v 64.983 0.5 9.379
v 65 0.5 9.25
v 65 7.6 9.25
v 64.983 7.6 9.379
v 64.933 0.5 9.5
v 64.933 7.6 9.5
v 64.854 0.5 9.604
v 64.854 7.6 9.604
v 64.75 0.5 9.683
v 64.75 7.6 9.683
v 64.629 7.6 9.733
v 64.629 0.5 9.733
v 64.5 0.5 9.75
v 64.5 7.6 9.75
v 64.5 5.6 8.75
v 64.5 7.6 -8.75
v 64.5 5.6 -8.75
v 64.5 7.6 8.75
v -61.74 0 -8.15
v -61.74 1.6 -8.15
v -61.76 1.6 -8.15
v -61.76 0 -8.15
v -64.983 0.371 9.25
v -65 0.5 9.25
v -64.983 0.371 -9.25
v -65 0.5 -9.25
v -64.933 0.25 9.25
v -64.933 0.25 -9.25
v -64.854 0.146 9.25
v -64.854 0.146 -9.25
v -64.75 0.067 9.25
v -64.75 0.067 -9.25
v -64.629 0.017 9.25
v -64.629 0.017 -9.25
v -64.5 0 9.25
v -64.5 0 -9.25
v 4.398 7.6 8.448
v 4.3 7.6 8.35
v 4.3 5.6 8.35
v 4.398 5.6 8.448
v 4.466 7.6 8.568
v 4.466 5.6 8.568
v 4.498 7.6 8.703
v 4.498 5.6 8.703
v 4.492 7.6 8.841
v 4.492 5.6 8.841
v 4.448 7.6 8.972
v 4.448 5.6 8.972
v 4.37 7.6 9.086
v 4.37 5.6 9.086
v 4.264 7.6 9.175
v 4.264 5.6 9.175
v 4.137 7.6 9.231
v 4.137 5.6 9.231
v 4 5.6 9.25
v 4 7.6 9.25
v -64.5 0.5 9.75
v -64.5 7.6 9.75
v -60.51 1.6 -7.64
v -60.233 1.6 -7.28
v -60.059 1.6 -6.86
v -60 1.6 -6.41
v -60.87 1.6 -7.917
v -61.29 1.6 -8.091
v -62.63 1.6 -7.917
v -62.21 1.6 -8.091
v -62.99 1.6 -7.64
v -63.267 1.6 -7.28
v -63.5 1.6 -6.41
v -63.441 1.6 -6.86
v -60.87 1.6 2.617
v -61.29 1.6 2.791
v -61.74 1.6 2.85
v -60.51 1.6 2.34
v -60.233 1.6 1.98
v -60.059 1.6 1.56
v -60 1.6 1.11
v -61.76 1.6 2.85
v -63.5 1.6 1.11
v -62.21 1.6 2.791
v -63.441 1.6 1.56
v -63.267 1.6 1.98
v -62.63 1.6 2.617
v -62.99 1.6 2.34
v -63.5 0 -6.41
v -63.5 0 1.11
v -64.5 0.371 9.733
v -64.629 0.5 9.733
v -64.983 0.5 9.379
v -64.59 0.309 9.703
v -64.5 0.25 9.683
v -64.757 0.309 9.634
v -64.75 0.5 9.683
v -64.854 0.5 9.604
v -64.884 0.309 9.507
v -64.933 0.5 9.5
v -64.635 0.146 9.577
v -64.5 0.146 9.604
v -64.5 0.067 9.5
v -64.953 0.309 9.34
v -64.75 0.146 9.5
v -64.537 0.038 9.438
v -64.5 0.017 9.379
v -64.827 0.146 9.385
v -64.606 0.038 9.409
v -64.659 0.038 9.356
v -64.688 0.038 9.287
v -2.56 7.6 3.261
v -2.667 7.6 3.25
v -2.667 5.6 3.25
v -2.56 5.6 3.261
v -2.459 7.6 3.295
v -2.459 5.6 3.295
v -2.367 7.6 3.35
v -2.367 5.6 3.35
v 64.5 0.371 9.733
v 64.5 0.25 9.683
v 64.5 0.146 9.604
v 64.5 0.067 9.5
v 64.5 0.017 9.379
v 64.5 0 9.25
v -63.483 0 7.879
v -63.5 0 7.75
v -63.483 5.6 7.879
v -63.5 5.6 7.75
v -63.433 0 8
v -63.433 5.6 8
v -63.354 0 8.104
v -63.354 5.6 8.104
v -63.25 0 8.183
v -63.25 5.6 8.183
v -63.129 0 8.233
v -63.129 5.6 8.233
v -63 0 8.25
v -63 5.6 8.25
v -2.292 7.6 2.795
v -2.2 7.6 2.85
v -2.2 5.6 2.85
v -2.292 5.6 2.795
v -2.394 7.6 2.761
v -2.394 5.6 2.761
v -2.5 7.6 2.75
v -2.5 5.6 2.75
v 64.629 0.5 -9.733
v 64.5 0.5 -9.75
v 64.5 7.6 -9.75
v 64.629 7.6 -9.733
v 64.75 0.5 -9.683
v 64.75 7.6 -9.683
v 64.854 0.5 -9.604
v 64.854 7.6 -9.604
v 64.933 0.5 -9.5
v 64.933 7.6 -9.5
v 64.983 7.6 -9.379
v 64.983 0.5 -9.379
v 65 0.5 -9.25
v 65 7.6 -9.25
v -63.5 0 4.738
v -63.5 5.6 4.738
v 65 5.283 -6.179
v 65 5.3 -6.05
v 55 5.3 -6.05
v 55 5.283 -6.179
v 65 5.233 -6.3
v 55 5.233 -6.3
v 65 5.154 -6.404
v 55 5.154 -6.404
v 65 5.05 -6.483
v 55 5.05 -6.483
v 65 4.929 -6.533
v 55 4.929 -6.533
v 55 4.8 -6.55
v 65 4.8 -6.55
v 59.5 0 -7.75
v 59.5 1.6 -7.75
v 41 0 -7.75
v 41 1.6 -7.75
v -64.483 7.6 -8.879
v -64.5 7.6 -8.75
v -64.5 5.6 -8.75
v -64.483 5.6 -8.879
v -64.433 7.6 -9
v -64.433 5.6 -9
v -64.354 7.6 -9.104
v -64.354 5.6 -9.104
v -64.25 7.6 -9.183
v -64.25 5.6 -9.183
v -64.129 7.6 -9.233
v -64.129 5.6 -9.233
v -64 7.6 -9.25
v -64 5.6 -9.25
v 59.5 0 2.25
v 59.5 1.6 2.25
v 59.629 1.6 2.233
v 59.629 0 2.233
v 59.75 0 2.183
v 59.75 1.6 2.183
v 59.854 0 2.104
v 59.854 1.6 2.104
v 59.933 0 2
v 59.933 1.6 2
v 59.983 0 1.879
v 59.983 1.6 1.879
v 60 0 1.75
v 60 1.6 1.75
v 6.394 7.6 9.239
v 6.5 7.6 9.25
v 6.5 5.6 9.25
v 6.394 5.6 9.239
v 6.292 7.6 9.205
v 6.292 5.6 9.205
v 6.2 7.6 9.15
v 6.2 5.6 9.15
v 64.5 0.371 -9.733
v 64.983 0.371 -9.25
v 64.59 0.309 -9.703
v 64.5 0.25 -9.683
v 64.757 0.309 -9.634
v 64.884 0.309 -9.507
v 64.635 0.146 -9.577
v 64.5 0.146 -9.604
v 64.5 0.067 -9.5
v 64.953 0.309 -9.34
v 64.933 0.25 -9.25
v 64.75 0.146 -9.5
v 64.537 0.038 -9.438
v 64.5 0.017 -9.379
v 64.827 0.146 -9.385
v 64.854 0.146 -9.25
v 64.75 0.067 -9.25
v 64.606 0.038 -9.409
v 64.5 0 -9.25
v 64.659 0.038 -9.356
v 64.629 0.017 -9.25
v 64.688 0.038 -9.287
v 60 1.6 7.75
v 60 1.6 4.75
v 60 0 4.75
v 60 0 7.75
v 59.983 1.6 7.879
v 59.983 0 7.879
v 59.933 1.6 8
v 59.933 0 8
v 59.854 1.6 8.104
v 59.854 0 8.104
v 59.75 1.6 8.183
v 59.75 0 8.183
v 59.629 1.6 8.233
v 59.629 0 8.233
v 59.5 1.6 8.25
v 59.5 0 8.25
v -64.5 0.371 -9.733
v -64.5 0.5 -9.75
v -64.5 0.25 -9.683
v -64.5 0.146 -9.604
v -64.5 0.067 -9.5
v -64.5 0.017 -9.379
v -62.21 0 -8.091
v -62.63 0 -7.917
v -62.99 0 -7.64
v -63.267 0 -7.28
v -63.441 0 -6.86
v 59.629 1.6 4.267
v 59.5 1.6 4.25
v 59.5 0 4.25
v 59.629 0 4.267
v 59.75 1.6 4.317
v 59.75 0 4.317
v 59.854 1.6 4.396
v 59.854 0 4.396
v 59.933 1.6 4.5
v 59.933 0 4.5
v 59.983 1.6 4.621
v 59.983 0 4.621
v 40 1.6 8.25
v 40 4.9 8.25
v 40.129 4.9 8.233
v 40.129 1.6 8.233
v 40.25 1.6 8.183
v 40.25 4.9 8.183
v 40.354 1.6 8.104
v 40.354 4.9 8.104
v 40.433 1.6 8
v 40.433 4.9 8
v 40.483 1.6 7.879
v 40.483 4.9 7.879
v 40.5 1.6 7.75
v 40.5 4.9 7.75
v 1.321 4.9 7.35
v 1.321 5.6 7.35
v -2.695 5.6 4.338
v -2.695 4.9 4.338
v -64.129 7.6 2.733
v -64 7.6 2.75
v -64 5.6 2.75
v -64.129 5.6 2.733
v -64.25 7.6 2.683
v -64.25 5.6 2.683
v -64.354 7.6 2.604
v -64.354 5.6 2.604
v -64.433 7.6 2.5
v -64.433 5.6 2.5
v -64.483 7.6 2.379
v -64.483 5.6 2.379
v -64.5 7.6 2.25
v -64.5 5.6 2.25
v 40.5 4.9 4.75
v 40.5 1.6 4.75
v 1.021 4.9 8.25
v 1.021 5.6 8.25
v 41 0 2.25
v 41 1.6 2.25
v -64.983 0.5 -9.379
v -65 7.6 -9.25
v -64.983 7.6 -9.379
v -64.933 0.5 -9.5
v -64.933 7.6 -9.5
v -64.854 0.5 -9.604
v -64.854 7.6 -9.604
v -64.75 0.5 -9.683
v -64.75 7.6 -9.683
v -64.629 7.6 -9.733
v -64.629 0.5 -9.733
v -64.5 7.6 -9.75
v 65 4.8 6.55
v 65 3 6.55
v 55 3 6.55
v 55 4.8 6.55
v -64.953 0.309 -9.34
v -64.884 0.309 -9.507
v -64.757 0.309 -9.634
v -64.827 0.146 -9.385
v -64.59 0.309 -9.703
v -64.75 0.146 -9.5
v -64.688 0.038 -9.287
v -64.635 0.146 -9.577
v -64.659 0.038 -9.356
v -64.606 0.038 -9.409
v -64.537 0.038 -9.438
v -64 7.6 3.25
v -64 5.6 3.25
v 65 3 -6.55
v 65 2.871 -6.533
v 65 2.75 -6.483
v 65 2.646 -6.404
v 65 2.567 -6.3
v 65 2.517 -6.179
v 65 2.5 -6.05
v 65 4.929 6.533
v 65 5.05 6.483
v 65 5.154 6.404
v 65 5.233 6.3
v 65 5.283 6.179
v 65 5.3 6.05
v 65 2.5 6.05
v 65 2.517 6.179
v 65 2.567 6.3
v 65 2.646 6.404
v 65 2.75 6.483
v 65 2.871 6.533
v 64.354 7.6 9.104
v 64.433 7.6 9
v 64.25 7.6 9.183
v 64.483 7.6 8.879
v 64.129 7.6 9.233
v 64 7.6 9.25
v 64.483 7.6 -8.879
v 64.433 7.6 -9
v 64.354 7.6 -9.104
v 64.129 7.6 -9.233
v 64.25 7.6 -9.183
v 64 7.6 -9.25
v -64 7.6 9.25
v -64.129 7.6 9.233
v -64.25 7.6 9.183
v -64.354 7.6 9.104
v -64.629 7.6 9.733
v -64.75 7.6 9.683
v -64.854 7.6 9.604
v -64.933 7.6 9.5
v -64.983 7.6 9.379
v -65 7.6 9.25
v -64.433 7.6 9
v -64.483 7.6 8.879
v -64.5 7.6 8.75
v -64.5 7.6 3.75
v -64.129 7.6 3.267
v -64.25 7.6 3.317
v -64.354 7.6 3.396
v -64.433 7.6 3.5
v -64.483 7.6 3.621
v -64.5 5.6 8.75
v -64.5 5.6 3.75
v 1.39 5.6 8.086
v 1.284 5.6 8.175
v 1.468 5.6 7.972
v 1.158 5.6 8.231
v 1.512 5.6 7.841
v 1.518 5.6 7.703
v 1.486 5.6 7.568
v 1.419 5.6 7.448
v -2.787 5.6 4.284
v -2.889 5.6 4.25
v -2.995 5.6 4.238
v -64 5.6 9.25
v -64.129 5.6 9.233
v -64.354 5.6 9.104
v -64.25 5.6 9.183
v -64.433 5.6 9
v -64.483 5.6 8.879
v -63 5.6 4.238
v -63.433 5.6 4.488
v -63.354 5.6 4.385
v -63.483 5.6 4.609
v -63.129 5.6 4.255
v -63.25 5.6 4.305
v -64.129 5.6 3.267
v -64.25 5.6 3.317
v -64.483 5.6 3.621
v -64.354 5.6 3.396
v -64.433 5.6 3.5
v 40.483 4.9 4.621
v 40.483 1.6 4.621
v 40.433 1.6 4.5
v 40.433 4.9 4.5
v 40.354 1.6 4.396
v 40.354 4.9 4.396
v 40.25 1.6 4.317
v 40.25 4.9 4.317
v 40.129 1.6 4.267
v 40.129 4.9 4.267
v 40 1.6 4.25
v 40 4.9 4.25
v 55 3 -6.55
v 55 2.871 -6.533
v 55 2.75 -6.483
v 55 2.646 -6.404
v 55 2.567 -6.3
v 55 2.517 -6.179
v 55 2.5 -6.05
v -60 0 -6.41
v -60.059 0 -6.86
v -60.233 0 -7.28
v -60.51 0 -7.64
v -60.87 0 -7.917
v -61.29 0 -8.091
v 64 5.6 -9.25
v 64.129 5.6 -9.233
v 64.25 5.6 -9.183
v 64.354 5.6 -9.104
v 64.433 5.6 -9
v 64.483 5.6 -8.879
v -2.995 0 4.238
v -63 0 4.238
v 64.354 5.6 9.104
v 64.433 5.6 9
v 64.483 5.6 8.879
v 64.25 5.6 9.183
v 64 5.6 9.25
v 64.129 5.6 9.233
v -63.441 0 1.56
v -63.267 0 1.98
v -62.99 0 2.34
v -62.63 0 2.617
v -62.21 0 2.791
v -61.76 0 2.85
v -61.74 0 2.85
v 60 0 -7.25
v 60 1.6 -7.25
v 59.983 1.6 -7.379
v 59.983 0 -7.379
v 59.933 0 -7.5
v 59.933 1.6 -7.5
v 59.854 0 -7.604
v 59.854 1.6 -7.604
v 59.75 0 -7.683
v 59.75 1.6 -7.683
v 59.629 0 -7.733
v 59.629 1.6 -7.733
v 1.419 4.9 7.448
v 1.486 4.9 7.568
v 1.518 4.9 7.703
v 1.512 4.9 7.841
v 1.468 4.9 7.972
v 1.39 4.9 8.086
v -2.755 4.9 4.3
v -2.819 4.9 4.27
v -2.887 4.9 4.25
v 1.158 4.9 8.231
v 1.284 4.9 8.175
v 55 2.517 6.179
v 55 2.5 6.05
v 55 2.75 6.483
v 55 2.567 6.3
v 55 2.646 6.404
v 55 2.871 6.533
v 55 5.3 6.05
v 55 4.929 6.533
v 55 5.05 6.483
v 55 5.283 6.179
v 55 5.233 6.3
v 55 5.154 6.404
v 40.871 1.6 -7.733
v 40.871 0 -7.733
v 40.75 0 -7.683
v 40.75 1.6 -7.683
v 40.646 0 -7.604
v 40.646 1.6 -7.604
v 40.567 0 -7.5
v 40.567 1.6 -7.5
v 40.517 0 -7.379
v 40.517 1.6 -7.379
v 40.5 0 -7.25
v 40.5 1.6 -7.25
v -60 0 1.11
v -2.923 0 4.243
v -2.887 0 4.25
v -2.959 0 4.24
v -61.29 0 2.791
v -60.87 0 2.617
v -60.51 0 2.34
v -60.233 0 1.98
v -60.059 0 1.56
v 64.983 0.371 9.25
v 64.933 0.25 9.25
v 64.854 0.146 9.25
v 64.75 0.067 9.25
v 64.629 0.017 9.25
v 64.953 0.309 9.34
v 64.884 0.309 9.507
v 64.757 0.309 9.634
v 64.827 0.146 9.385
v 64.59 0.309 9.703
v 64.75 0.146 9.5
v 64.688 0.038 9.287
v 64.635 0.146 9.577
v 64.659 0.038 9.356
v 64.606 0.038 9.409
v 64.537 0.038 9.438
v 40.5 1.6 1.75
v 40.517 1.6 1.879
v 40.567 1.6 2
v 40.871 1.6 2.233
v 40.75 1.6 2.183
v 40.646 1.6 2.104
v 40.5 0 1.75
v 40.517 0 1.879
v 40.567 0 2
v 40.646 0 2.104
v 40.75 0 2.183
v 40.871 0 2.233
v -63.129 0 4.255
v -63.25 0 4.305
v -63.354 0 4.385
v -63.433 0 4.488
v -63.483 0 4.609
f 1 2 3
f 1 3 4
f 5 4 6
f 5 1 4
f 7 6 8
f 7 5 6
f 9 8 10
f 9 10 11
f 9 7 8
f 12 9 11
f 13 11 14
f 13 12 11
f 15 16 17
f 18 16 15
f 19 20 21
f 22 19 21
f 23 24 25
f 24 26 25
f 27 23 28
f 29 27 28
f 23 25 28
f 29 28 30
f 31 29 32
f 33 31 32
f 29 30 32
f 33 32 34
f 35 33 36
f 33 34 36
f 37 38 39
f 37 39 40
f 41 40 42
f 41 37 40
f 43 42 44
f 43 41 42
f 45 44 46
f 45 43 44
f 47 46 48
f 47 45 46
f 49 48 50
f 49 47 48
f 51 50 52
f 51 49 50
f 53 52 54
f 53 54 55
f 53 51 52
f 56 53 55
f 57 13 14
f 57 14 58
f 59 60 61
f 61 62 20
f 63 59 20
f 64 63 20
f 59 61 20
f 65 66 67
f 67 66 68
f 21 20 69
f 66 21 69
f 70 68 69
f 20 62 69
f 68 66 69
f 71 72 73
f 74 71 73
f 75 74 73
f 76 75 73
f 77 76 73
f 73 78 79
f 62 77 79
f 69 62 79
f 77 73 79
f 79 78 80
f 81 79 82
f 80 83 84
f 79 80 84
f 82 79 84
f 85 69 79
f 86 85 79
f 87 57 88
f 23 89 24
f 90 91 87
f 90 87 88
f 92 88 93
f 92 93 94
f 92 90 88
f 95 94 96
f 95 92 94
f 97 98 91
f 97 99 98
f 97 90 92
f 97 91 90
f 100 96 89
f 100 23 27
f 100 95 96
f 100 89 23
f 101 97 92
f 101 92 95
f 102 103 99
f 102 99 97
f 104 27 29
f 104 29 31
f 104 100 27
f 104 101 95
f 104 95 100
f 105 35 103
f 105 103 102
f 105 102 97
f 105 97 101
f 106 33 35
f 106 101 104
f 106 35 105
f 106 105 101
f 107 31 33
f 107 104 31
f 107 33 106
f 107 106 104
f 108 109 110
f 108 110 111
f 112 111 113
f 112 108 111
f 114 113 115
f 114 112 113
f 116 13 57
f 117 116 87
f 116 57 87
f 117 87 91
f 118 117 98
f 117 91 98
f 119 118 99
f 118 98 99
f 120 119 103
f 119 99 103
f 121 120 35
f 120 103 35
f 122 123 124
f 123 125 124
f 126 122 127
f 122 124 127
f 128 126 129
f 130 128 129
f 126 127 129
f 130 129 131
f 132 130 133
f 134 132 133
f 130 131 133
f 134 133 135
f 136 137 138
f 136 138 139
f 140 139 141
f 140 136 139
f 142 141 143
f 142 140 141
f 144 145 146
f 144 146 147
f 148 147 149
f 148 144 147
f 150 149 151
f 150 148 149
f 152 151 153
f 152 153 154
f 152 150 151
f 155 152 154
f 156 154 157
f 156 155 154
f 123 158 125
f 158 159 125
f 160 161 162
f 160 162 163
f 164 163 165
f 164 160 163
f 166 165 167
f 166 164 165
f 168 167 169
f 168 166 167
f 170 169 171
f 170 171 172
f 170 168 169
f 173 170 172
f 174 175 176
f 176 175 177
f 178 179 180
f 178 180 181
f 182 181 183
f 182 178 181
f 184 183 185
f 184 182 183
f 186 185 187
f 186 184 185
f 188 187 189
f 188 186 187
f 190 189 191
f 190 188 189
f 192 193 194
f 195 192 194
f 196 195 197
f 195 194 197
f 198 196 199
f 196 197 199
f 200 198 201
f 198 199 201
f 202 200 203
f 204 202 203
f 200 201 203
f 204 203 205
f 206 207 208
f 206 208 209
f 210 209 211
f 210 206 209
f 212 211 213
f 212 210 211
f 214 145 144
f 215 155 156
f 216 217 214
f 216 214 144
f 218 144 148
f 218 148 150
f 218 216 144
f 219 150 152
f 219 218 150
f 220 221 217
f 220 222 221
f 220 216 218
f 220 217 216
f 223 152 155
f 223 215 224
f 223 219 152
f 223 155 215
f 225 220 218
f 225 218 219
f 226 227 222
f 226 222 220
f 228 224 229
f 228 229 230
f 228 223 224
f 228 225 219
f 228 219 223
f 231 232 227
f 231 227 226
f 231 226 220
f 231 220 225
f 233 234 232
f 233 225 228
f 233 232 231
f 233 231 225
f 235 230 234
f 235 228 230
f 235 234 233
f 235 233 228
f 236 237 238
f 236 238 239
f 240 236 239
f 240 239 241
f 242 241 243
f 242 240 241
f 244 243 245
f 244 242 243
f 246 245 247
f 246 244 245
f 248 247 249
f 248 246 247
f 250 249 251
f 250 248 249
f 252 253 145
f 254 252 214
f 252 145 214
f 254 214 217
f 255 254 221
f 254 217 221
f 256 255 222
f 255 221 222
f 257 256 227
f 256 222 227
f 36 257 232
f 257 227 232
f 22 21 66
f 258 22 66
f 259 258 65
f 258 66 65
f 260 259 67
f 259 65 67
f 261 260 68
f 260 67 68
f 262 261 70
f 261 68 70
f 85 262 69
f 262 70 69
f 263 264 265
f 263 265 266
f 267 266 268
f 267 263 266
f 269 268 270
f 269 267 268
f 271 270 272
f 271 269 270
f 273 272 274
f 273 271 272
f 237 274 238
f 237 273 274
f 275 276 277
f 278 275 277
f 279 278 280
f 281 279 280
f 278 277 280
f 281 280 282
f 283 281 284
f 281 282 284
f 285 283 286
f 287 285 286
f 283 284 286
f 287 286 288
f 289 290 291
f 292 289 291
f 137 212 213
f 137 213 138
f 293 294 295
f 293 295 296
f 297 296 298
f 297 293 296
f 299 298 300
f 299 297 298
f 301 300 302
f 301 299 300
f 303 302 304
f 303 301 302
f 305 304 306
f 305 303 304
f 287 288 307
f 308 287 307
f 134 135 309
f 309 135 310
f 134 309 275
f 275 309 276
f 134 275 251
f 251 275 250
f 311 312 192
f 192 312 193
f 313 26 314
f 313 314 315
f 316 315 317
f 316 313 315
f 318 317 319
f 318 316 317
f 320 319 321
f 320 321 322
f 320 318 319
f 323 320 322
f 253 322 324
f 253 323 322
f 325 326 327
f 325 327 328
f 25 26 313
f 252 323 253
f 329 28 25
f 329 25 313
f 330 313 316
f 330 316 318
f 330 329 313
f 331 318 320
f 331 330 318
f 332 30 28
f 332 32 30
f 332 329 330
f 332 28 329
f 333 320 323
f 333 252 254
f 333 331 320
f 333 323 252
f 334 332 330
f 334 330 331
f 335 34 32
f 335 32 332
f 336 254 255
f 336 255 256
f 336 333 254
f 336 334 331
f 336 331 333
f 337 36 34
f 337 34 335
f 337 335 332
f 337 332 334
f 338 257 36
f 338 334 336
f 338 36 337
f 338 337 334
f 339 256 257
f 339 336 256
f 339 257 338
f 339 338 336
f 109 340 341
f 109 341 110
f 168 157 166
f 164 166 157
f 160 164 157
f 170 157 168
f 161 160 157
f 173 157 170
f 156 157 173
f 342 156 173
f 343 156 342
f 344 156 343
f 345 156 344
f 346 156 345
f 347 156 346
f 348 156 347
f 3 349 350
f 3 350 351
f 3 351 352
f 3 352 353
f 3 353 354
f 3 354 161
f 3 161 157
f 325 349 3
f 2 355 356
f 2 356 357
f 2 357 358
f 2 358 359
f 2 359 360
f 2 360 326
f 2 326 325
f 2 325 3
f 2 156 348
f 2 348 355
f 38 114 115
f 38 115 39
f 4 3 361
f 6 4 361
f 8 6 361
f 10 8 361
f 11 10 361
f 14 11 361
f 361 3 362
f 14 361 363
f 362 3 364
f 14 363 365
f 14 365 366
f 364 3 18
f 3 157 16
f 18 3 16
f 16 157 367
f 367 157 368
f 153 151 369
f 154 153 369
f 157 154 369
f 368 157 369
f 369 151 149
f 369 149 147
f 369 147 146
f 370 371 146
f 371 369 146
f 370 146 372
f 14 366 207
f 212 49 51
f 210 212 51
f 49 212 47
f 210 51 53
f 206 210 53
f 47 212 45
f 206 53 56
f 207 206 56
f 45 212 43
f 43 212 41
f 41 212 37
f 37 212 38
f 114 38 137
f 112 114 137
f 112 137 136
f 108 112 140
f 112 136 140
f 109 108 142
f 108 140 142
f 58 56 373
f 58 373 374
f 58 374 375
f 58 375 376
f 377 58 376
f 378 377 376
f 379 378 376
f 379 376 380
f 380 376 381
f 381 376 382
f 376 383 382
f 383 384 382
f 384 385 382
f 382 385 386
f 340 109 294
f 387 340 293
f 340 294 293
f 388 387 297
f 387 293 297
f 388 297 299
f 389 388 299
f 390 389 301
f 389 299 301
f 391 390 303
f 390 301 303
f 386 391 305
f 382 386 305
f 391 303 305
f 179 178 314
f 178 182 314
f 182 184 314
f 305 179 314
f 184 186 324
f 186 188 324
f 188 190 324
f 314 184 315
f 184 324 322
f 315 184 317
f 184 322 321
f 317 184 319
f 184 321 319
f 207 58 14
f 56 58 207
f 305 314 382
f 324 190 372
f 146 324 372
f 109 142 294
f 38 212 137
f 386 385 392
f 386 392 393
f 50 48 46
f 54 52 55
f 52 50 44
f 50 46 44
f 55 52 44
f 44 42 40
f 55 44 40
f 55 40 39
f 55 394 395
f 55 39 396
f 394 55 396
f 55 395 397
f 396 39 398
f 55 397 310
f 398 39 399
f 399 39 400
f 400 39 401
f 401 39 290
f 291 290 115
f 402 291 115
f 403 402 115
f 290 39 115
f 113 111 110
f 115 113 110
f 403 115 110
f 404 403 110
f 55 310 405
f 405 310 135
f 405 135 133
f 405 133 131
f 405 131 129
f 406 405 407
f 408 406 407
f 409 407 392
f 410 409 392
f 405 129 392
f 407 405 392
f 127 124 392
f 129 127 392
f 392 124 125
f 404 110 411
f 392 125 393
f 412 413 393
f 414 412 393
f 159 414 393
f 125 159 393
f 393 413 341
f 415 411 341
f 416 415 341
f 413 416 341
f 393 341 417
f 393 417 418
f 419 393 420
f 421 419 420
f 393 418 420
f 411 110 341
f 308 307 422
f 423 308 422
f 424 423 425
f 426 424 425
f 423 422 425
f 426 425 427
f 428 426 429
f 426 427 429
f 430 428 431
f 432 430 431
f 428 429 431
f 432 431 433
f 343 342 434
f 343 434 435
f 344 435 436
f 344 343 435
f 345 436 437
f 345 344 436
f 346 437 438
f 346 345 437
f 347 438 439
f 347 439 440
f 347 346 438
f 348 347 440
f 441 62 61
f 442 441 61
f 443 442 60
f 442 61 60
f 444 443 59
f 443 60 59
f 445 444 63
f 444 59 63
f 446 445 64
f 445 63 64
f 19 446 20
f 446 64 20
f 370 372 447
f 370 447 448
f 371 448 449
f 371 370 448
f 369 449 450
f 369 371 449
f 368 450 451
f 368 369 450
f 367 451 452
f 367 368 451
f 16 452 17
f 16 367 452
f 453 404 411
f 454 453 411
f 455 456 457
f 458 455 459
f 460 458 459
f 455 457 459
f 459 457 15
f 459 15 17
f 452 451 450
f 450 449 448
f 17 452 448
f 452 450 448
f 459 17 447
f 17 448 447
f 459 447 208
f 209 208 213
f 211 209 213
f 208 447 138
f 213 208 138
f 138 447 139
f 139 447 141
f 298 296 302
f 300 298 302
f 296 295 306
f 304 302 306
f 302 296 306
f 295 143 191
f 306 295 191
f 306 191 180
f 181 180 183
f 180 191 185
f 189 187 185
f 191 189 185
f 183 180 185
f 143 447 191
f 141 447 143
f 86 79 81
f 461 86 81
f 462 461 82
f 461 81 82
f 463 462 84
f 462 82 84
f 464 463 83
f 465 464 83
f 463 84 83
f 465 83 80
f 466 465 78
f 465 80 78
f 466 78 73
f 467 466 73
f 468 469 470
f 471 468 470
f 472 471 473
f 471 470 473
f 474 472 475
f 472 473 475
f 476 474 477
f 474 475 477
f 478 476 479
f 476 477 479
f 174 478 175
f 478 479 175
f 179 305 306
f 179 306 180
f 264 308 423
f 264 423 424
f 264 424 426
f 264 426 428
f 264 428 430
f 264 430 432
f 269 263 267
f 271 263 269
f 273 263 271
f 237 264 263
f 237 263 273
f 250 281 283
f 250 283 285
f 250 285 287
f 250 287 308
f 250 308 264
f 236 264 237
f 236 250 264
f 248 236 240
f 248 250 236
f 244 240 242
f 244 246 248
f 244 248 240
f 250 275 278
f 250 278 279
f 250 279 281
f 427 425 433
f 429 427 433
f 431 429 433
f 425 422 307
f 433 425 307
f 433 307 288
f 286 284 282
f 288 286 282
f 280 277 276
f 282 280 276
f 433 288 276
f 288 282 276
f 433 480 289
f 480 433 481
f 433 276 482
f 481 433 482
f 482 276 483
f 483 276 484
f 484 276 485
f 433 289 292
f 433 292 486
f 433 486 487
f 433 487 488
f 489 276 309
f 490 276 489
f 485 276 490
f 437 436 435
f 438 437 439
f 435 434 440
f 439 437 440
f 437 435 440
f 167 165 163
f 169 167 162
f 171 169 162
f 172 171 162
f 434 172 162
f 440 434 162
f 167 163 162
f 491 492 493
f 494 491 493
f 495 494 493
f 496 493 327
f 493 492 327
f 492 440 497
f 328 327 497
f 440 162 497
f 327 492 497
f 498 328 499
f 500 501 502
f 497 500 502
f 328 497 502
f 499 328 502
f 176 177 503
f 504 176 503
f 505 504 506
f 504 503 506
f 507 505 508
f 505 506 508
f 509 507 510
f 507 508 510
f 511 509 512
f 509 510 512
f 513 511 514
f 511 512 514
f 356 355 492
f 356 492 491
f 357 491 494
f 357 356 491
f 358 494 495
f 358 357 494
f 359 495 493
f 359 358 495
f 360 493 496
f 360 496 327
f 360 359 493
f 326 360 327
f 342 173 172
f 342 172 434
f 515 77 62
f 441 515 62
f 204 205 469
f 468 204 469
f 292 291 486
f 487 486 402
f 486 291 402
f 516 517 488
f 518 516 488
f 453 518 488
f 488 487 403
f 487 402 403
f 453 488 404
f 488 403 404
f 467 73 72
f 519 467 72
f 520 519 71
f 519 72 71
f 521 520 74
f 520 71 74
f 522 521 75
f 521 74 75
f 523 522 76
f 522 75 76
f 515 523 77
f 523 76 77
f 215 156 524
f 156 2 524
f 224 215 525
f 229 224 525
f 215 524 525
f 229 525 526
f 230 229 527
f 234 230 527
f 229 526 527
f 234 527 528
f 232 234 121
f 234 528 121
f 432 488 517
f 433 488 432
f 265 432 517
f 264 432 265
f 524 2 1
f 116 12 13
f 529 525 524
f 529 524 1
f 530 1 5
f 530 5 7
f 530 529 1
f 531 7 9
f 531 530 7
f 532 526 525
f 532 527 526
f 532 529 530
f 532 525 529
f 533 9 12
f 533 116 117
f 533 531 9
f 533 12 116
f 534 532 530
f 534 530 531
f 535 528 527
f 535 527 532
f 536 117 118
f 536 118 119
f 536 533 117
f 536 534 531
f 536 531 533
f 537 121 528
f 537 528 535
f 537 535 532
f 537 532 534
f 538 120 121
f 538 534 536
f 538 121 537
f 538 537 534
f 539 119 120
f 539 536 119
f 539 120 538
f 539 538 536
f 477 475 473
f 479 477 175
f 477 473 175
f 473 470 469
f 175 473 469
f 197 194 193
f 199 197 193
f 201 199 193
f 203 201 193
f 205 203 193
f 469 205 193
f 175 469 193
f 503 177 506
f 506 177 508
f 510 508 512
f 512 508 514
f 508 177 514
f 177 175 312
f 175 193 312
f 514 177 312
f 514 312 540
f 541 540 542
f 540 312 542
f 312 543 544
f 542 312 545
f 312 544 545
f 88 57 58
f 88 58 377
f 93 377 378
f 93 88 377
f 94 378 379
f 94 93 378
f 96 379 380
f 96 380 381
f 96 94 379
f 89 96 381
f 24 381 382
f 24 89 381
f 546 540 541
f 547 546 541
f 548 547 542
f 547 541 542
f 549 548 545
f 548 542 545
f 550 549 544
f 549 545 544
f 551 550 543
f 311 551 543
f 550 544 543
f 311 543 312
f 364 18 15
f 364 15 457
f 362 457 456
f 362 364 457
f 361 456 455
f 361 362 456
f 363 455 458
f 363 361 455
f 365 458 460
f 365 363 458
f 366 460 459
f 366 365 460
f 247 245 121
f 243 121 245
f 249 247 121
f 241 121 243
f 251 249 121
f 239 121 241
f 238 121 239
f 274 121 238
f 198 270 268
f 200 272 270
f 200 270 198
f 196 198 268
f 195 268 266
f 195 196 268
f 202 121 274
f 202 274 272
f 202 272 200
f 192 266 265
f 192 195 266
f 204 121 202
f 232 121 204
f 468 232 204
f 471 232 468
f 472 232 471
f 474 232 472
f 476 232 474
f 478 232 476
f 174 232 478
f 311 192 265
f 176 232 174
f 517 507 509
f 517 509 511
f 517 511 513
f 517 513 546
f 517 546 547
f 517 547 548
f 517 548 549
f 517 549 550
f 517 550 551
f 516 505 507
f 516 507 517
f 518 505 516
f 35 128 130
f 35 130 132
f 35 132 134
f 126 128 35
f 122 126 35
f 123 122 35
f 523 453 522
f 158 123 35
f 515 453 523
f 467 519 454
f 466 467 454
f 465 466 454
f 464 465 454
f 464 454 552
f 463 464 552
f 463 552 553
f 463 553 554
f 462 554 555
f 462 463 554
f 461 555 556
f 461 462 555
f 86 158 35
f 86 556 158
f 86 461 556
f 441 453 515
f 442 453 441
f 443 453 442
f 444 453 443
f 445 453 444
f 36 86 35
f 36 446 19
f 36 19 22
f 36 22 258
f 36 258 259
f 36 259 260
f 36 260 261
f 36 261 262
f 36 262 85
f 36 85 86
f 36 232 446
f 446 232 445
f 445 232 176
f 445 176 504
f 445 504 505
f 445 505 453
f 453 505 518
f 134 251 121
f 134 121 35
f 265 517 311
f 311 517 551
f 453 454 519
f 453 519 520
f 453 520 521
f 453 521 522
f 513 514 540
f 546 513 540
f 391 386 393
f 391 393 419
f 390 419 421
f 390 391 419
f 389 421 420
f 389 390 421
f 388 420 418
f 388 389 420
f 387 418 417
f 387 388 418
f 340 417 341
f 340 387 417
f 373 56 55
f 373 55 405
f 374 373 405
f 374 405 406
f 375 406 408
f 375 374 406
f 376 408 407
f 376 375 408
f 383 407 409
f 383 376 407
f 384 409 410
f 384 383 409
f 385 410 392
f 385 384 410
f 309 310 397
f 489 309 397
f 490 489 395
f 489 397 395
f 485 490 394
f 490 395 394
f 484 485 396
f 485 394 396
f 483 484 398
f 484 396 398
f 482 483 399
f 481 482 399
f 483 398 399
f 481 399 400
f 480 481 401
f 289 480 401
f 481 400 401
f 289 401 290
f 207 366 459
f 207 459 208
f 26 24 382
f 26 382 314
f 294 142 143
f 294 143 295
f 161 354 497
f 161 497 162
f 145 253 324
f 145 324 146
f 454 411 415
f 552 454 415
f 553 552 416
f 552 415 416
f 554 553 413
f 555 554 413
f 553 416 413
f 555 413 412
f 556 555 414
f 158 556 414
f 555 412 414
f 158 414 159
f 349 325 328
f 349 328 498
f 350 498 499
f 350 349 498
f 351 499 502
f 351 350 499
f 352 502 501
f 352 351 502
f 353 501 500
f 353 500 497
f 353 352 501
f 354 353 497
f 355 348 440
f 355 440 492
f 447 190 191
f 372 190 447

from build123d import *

# Parameters (mm, degrees)
EXTRUDE_1_DEPTH     = 7.6
CUT_EXTRUDE_1_DEPTH = 2
CUT_EXTRUDE_2_DEPTH = 66.965312855
CUT_EXTRUDE_START   = -1.6
CUT_EXTRUDE_3_DEPTH = 1.6
CUT_EXTRUDE_START_2 = -3.3
CUT_EXTRUDE_4_DEPTH = 3.3
CUT_EXTRUDE_5_DEPTH = 10
FILLET_1_R          = 0.5


with BuildPart() as part:
    # Эскиз1 → Бобышка-Вытянуть1 (new body)
    with BuildSketch(Plane(origin=(0, 0, 0), x_dir=(1, 0, 0), z_dir=(0, 1, 0))):
        with BuildLine():
            Line((-64.5, 9.75), (64.5, 9.75))
            ThreePointArc((64.5, 9.75), (64.853553391, 9.603553391), (65, 9.25))
            Line((65, 9.25), (65, -9.25))
            ThreePointArc((65, -9.25), (64.853553391, -9.603553391), (64.5, -9.75))
            Line((64.5, -9.75), (-64.5, -9.75))
            ThreePointArc((-64.5, -9.75), (-64.853553391, -9.603553391), (-65, -9.25))
            Line((-65, -9.25), (-65, 9.25))
            ThreePointArc((-65, 9.25), (-64.853553391, 9.603553391), (-64.5, 9.75))
        make_face()
    extrude(amount=EXTRUDE_1_DEPTH)

    # Эскиз2 → Вырез-Вытянуть1 (cut)
    with BuildSketch(Plane(origin=(0, 7.6, 0), x_dir=(1, 0, 0), z_dir=(0, 1, 0))):
        with BuildLine():
            Line((-64, -3.25), (-2.666666667, -3.25))
            ThreePointArc((-2.666666667, -3.25), (-2.508552784, -3.275658351), (-2.366666667, -3.35))
            Line((-2.366666667, -3.35), (4.3, -8.35))
            ThreePointArc((4.3, -8.35), (4.474341649, -8.908113883), (4, -9.25))
            Line((4, -9.25), (-64, -9.25))
            ThreePointArc((-64, -9.25), (-64.353553391, -9.103553391), (-64.5, -8.75))
            Line((-64.5, -8.75), (-64.5, -3.75))
            ThreePointArc((-64.5, -3.75), (-64.353553391, -3.396446609), (-64, -3.25))
        make_face()
        with BuildLine():
            Line((-64, 9.25), (64, 9.25))
            ThreePointArc((64, 9.25), (64.353553391, 9.103553391), (64.5, 8.75))
            Line((64.5, 8.75), (64.5, -8.75))
            ThreePointArc((64.5, -8.75), (64.353553391, -9.103553391), (64, -9.25))
            Line((64, -9.25), (6.5, -9.25))
            ThreePointArc((6.5, -9.25), (6.341886117, -9.224341649), (6.2, -9.15))
            Line((6.2, -9.15), (-2.2, -2.85))
            ThreePointArc((-2.2, -2.85), (-2.341886117, -2.775658351), (-2.5, -2.75))
            Line((-2.5, -2.75), (-64, -2.75))
            ThreePointArc((-64, -2.75), (-64.353553391, -2.603553391), (-64.5, -2.25))
            Line((-64.5, -2.25), (-64.5, 8.75))
            ThreePointArc((-64.5, 8.75), (-64.353553391, 9.103553391), (-64, 9.25))
        make_face()
    extrude(amount=-CUT_EXTRUDE_1_DEPTH, mode=Mode.SUBTRACT)

    # Эскиз6 → Вырез-Вытянуть2 (cut, through all)
    with BuildSketch(Plane(origin=(0, 5.6, 0), x_dir=(1, 0, 0), z_dir=(0, 1, 0))):
        with BuildLine():
            Line((-63, -8.25), (1.020582083, -8.25))
            ThreePointArc((1.020582083, -8.25), (1.494923732, -7.908113883), (1.320582083, -7.35))
            Line((1.320582083, -7.35), (-2.695152274, -4.338199232))
            ThreePointArc((-2.695152274, -4.338199232), (-2.837038391, -4.263857583), (-2.995152274, -4.238199232))
            Line((-2.995152274, -4.238199232), (-63, -4.238199232))
            ThreePointArc((-63, -4.238199232), (-63.353553391, -4.384645841), (-63.5, -4.738199232))
            Line((-63.5, -4.738199232), (-63.5, -7.75))
            ThreePointArc((-63.5, -7.75), (-63.353553391, -8.103553391), (-63, -8.25))
        make_face()
    extrude(amount=-CUT_EXTRUDE_2_DEPTH, mode=Mode.SUBTRACT)

    # Эскиз7 → Вырез-Вытянуть3 (cut)
    with BuildSketch(Plane.XZ.offset(CUT_EXTRUDE_START)):
        with BuildLine():
            Line((-63, 4.25), (59.5, 4.25))
            ThreePointArc((59.5, 4.25), (59.853553391, 4.396446609), (60, 4.75))
            Line((60, 4.75), (60, 7.75))
            ThreePointArc((60, 7.75), (59.853553391, 8.103553391), (59.5, 8.25))
            Line((59.5, 8.25), (-63, 8.25))
            ThreePointArc((-63, 8.25), (-63.353553391, 8.103553391), (-63.5, 7.75))
            Line((-63.5, 7.75), (-63.5, 4.75))
            ThreePointArc((-63.5, 4.75), (-63.353553391, 4.396446609), (-63, 4.25))
        make_face()
        with BuildLine():
            Line((59.5, -7.75), (41, -7.75))
            ThreePointArc((41, -7.75), (40.646446609, -7.603553391), (40.5, -7.25))
            Line((40.5, -7.25), (40.5, 1.75))
            ThreePointArc((40.5, 1.75), (40.646446609, 2.103553391), (41, 2.25))
            Line((41, 2.25), (59.5, 2.25))
            ThreePointArc((59.5, 2.25), (59.853553391, 2.103553391), (60, 1.75))
            Line((60, 1.75), (60, -7.25))
            ThreePointArc((60, -7.25), (59.853553391, -7.603553391), (59.5, -7.75))
        make_face()
        with BuildLine():
            Line((-61.74, -8.15), (-61.76, -8.15))
            ThreePointArc((-61.76, -8.15), (-62.990365799, -7.640365799), (-63.5, -6.41))
            Line((-63.5, -6.41), (-63.5, 1.11))
            ThreePointArc((-63.5, 1.11), (-62.990365799, 2.340365799), (-61.76, 2.85))
            Line((-61.76, 2.85), (-61.74, 2.85))
            ThreePointArc((-61.74, 2.85), (-60.509634201, 2.340365799), (-60, 1.11))
            Line((-60, 1.11), (-60, -6.41))
            ThreePointArc((-60, -6.41), (-60.509634201, -7.640365799), (-61.74, -8.15))
        make_face()
    extrude(amount=CUT_EXTRUDE_3_DEPTH, mode=Mode.SUBTRACT)

    # Эскиз8 → Вырез-Вытянуть4 (cut)
    with BuildSketch(Plane.XZ.offset(-1.6).offset(CUT_EXTRUDE_START_2)):
        with BuildLine():
            Line((-63, 8.25), (40, 8.25))
            ThreePointArc((40, 8.25), (40.353553391, 8.103553391), (40.5, 7.75))
            Line((40.5, 7.75), (40.5, 4.75))
            ThreePointArc((40.5, 4.75), (40.353553391, 4.396446609), (40, 4.25))
            Line((40, 4.25), (-63, 4.25))
            ThreePointArc((-63, 4.25), (-63.353553391, 4.396446609), (-63.5, 4.75))
            Line((-63.5, 4.75), (-63.5, 7.75))
            ThreePointArc((-63.5, 7.75), (-63.353553391, 8.103553391), (-63, 8.25))
        make_face()
    extrude(amount=CUT_EXTRUDE_4_DEPTH, mode=Mode.SUBTRACT)

    # Эскиз9 → Вырез-Вытянуть5 (cut)
    with BuildSketch(Plane(origin=(65, 0, 0), x_dir=(0, 0, -1), z_dir=(1, 0, 0))):
        with BuildLine():
            Line((-6.05, 5.3), (6.05, 5.3))
            ThreePointArc((6.05, 5.3), (6.403553391, 5.153553391), (6.55, 4.8))
            Line((6.55, 4.8), (6.55, 3))
            ThreePointArc((6.55, 3), (6.403553391, 2.646446609), (6.05, 2.5))
            Line((6.05, 2.5), (-6.05, 2.5))
            ThreePointArc((-6.05, 2.5), (-6.403553391, 2.646446609), (-6.55, 3))
            Line((-6.55, 3), (-6.55, 4.8))
            ThreePointArc((-6.55, 4.8), (-6.403553391, 5.153553391), (-6.05, 5.3))
        make_face()
    extrude(amount=-CUT_EXTRUDE_5_DEPTH, mode=Mode.SUBTRACT)

    # Скругление1
    fillet_1_edges = [part.edges().sort_by_distance(p)[0] for p in [
        (0, 0, -9.75),
        (64.853553391, 0, -9.603553391),
        (65, 0, 0),
        (64.853553391, 0, 9.603553391),
        (0, 0, 9.75),
        (-64.853553391, 0, 9.603553391),
        (-65, 0, 0),
        (-64.853553391, 0, -9.603553391),
    ]]
    fillet(fillet_1_edges, radius=FILLET_1_R)


solid = part.part
